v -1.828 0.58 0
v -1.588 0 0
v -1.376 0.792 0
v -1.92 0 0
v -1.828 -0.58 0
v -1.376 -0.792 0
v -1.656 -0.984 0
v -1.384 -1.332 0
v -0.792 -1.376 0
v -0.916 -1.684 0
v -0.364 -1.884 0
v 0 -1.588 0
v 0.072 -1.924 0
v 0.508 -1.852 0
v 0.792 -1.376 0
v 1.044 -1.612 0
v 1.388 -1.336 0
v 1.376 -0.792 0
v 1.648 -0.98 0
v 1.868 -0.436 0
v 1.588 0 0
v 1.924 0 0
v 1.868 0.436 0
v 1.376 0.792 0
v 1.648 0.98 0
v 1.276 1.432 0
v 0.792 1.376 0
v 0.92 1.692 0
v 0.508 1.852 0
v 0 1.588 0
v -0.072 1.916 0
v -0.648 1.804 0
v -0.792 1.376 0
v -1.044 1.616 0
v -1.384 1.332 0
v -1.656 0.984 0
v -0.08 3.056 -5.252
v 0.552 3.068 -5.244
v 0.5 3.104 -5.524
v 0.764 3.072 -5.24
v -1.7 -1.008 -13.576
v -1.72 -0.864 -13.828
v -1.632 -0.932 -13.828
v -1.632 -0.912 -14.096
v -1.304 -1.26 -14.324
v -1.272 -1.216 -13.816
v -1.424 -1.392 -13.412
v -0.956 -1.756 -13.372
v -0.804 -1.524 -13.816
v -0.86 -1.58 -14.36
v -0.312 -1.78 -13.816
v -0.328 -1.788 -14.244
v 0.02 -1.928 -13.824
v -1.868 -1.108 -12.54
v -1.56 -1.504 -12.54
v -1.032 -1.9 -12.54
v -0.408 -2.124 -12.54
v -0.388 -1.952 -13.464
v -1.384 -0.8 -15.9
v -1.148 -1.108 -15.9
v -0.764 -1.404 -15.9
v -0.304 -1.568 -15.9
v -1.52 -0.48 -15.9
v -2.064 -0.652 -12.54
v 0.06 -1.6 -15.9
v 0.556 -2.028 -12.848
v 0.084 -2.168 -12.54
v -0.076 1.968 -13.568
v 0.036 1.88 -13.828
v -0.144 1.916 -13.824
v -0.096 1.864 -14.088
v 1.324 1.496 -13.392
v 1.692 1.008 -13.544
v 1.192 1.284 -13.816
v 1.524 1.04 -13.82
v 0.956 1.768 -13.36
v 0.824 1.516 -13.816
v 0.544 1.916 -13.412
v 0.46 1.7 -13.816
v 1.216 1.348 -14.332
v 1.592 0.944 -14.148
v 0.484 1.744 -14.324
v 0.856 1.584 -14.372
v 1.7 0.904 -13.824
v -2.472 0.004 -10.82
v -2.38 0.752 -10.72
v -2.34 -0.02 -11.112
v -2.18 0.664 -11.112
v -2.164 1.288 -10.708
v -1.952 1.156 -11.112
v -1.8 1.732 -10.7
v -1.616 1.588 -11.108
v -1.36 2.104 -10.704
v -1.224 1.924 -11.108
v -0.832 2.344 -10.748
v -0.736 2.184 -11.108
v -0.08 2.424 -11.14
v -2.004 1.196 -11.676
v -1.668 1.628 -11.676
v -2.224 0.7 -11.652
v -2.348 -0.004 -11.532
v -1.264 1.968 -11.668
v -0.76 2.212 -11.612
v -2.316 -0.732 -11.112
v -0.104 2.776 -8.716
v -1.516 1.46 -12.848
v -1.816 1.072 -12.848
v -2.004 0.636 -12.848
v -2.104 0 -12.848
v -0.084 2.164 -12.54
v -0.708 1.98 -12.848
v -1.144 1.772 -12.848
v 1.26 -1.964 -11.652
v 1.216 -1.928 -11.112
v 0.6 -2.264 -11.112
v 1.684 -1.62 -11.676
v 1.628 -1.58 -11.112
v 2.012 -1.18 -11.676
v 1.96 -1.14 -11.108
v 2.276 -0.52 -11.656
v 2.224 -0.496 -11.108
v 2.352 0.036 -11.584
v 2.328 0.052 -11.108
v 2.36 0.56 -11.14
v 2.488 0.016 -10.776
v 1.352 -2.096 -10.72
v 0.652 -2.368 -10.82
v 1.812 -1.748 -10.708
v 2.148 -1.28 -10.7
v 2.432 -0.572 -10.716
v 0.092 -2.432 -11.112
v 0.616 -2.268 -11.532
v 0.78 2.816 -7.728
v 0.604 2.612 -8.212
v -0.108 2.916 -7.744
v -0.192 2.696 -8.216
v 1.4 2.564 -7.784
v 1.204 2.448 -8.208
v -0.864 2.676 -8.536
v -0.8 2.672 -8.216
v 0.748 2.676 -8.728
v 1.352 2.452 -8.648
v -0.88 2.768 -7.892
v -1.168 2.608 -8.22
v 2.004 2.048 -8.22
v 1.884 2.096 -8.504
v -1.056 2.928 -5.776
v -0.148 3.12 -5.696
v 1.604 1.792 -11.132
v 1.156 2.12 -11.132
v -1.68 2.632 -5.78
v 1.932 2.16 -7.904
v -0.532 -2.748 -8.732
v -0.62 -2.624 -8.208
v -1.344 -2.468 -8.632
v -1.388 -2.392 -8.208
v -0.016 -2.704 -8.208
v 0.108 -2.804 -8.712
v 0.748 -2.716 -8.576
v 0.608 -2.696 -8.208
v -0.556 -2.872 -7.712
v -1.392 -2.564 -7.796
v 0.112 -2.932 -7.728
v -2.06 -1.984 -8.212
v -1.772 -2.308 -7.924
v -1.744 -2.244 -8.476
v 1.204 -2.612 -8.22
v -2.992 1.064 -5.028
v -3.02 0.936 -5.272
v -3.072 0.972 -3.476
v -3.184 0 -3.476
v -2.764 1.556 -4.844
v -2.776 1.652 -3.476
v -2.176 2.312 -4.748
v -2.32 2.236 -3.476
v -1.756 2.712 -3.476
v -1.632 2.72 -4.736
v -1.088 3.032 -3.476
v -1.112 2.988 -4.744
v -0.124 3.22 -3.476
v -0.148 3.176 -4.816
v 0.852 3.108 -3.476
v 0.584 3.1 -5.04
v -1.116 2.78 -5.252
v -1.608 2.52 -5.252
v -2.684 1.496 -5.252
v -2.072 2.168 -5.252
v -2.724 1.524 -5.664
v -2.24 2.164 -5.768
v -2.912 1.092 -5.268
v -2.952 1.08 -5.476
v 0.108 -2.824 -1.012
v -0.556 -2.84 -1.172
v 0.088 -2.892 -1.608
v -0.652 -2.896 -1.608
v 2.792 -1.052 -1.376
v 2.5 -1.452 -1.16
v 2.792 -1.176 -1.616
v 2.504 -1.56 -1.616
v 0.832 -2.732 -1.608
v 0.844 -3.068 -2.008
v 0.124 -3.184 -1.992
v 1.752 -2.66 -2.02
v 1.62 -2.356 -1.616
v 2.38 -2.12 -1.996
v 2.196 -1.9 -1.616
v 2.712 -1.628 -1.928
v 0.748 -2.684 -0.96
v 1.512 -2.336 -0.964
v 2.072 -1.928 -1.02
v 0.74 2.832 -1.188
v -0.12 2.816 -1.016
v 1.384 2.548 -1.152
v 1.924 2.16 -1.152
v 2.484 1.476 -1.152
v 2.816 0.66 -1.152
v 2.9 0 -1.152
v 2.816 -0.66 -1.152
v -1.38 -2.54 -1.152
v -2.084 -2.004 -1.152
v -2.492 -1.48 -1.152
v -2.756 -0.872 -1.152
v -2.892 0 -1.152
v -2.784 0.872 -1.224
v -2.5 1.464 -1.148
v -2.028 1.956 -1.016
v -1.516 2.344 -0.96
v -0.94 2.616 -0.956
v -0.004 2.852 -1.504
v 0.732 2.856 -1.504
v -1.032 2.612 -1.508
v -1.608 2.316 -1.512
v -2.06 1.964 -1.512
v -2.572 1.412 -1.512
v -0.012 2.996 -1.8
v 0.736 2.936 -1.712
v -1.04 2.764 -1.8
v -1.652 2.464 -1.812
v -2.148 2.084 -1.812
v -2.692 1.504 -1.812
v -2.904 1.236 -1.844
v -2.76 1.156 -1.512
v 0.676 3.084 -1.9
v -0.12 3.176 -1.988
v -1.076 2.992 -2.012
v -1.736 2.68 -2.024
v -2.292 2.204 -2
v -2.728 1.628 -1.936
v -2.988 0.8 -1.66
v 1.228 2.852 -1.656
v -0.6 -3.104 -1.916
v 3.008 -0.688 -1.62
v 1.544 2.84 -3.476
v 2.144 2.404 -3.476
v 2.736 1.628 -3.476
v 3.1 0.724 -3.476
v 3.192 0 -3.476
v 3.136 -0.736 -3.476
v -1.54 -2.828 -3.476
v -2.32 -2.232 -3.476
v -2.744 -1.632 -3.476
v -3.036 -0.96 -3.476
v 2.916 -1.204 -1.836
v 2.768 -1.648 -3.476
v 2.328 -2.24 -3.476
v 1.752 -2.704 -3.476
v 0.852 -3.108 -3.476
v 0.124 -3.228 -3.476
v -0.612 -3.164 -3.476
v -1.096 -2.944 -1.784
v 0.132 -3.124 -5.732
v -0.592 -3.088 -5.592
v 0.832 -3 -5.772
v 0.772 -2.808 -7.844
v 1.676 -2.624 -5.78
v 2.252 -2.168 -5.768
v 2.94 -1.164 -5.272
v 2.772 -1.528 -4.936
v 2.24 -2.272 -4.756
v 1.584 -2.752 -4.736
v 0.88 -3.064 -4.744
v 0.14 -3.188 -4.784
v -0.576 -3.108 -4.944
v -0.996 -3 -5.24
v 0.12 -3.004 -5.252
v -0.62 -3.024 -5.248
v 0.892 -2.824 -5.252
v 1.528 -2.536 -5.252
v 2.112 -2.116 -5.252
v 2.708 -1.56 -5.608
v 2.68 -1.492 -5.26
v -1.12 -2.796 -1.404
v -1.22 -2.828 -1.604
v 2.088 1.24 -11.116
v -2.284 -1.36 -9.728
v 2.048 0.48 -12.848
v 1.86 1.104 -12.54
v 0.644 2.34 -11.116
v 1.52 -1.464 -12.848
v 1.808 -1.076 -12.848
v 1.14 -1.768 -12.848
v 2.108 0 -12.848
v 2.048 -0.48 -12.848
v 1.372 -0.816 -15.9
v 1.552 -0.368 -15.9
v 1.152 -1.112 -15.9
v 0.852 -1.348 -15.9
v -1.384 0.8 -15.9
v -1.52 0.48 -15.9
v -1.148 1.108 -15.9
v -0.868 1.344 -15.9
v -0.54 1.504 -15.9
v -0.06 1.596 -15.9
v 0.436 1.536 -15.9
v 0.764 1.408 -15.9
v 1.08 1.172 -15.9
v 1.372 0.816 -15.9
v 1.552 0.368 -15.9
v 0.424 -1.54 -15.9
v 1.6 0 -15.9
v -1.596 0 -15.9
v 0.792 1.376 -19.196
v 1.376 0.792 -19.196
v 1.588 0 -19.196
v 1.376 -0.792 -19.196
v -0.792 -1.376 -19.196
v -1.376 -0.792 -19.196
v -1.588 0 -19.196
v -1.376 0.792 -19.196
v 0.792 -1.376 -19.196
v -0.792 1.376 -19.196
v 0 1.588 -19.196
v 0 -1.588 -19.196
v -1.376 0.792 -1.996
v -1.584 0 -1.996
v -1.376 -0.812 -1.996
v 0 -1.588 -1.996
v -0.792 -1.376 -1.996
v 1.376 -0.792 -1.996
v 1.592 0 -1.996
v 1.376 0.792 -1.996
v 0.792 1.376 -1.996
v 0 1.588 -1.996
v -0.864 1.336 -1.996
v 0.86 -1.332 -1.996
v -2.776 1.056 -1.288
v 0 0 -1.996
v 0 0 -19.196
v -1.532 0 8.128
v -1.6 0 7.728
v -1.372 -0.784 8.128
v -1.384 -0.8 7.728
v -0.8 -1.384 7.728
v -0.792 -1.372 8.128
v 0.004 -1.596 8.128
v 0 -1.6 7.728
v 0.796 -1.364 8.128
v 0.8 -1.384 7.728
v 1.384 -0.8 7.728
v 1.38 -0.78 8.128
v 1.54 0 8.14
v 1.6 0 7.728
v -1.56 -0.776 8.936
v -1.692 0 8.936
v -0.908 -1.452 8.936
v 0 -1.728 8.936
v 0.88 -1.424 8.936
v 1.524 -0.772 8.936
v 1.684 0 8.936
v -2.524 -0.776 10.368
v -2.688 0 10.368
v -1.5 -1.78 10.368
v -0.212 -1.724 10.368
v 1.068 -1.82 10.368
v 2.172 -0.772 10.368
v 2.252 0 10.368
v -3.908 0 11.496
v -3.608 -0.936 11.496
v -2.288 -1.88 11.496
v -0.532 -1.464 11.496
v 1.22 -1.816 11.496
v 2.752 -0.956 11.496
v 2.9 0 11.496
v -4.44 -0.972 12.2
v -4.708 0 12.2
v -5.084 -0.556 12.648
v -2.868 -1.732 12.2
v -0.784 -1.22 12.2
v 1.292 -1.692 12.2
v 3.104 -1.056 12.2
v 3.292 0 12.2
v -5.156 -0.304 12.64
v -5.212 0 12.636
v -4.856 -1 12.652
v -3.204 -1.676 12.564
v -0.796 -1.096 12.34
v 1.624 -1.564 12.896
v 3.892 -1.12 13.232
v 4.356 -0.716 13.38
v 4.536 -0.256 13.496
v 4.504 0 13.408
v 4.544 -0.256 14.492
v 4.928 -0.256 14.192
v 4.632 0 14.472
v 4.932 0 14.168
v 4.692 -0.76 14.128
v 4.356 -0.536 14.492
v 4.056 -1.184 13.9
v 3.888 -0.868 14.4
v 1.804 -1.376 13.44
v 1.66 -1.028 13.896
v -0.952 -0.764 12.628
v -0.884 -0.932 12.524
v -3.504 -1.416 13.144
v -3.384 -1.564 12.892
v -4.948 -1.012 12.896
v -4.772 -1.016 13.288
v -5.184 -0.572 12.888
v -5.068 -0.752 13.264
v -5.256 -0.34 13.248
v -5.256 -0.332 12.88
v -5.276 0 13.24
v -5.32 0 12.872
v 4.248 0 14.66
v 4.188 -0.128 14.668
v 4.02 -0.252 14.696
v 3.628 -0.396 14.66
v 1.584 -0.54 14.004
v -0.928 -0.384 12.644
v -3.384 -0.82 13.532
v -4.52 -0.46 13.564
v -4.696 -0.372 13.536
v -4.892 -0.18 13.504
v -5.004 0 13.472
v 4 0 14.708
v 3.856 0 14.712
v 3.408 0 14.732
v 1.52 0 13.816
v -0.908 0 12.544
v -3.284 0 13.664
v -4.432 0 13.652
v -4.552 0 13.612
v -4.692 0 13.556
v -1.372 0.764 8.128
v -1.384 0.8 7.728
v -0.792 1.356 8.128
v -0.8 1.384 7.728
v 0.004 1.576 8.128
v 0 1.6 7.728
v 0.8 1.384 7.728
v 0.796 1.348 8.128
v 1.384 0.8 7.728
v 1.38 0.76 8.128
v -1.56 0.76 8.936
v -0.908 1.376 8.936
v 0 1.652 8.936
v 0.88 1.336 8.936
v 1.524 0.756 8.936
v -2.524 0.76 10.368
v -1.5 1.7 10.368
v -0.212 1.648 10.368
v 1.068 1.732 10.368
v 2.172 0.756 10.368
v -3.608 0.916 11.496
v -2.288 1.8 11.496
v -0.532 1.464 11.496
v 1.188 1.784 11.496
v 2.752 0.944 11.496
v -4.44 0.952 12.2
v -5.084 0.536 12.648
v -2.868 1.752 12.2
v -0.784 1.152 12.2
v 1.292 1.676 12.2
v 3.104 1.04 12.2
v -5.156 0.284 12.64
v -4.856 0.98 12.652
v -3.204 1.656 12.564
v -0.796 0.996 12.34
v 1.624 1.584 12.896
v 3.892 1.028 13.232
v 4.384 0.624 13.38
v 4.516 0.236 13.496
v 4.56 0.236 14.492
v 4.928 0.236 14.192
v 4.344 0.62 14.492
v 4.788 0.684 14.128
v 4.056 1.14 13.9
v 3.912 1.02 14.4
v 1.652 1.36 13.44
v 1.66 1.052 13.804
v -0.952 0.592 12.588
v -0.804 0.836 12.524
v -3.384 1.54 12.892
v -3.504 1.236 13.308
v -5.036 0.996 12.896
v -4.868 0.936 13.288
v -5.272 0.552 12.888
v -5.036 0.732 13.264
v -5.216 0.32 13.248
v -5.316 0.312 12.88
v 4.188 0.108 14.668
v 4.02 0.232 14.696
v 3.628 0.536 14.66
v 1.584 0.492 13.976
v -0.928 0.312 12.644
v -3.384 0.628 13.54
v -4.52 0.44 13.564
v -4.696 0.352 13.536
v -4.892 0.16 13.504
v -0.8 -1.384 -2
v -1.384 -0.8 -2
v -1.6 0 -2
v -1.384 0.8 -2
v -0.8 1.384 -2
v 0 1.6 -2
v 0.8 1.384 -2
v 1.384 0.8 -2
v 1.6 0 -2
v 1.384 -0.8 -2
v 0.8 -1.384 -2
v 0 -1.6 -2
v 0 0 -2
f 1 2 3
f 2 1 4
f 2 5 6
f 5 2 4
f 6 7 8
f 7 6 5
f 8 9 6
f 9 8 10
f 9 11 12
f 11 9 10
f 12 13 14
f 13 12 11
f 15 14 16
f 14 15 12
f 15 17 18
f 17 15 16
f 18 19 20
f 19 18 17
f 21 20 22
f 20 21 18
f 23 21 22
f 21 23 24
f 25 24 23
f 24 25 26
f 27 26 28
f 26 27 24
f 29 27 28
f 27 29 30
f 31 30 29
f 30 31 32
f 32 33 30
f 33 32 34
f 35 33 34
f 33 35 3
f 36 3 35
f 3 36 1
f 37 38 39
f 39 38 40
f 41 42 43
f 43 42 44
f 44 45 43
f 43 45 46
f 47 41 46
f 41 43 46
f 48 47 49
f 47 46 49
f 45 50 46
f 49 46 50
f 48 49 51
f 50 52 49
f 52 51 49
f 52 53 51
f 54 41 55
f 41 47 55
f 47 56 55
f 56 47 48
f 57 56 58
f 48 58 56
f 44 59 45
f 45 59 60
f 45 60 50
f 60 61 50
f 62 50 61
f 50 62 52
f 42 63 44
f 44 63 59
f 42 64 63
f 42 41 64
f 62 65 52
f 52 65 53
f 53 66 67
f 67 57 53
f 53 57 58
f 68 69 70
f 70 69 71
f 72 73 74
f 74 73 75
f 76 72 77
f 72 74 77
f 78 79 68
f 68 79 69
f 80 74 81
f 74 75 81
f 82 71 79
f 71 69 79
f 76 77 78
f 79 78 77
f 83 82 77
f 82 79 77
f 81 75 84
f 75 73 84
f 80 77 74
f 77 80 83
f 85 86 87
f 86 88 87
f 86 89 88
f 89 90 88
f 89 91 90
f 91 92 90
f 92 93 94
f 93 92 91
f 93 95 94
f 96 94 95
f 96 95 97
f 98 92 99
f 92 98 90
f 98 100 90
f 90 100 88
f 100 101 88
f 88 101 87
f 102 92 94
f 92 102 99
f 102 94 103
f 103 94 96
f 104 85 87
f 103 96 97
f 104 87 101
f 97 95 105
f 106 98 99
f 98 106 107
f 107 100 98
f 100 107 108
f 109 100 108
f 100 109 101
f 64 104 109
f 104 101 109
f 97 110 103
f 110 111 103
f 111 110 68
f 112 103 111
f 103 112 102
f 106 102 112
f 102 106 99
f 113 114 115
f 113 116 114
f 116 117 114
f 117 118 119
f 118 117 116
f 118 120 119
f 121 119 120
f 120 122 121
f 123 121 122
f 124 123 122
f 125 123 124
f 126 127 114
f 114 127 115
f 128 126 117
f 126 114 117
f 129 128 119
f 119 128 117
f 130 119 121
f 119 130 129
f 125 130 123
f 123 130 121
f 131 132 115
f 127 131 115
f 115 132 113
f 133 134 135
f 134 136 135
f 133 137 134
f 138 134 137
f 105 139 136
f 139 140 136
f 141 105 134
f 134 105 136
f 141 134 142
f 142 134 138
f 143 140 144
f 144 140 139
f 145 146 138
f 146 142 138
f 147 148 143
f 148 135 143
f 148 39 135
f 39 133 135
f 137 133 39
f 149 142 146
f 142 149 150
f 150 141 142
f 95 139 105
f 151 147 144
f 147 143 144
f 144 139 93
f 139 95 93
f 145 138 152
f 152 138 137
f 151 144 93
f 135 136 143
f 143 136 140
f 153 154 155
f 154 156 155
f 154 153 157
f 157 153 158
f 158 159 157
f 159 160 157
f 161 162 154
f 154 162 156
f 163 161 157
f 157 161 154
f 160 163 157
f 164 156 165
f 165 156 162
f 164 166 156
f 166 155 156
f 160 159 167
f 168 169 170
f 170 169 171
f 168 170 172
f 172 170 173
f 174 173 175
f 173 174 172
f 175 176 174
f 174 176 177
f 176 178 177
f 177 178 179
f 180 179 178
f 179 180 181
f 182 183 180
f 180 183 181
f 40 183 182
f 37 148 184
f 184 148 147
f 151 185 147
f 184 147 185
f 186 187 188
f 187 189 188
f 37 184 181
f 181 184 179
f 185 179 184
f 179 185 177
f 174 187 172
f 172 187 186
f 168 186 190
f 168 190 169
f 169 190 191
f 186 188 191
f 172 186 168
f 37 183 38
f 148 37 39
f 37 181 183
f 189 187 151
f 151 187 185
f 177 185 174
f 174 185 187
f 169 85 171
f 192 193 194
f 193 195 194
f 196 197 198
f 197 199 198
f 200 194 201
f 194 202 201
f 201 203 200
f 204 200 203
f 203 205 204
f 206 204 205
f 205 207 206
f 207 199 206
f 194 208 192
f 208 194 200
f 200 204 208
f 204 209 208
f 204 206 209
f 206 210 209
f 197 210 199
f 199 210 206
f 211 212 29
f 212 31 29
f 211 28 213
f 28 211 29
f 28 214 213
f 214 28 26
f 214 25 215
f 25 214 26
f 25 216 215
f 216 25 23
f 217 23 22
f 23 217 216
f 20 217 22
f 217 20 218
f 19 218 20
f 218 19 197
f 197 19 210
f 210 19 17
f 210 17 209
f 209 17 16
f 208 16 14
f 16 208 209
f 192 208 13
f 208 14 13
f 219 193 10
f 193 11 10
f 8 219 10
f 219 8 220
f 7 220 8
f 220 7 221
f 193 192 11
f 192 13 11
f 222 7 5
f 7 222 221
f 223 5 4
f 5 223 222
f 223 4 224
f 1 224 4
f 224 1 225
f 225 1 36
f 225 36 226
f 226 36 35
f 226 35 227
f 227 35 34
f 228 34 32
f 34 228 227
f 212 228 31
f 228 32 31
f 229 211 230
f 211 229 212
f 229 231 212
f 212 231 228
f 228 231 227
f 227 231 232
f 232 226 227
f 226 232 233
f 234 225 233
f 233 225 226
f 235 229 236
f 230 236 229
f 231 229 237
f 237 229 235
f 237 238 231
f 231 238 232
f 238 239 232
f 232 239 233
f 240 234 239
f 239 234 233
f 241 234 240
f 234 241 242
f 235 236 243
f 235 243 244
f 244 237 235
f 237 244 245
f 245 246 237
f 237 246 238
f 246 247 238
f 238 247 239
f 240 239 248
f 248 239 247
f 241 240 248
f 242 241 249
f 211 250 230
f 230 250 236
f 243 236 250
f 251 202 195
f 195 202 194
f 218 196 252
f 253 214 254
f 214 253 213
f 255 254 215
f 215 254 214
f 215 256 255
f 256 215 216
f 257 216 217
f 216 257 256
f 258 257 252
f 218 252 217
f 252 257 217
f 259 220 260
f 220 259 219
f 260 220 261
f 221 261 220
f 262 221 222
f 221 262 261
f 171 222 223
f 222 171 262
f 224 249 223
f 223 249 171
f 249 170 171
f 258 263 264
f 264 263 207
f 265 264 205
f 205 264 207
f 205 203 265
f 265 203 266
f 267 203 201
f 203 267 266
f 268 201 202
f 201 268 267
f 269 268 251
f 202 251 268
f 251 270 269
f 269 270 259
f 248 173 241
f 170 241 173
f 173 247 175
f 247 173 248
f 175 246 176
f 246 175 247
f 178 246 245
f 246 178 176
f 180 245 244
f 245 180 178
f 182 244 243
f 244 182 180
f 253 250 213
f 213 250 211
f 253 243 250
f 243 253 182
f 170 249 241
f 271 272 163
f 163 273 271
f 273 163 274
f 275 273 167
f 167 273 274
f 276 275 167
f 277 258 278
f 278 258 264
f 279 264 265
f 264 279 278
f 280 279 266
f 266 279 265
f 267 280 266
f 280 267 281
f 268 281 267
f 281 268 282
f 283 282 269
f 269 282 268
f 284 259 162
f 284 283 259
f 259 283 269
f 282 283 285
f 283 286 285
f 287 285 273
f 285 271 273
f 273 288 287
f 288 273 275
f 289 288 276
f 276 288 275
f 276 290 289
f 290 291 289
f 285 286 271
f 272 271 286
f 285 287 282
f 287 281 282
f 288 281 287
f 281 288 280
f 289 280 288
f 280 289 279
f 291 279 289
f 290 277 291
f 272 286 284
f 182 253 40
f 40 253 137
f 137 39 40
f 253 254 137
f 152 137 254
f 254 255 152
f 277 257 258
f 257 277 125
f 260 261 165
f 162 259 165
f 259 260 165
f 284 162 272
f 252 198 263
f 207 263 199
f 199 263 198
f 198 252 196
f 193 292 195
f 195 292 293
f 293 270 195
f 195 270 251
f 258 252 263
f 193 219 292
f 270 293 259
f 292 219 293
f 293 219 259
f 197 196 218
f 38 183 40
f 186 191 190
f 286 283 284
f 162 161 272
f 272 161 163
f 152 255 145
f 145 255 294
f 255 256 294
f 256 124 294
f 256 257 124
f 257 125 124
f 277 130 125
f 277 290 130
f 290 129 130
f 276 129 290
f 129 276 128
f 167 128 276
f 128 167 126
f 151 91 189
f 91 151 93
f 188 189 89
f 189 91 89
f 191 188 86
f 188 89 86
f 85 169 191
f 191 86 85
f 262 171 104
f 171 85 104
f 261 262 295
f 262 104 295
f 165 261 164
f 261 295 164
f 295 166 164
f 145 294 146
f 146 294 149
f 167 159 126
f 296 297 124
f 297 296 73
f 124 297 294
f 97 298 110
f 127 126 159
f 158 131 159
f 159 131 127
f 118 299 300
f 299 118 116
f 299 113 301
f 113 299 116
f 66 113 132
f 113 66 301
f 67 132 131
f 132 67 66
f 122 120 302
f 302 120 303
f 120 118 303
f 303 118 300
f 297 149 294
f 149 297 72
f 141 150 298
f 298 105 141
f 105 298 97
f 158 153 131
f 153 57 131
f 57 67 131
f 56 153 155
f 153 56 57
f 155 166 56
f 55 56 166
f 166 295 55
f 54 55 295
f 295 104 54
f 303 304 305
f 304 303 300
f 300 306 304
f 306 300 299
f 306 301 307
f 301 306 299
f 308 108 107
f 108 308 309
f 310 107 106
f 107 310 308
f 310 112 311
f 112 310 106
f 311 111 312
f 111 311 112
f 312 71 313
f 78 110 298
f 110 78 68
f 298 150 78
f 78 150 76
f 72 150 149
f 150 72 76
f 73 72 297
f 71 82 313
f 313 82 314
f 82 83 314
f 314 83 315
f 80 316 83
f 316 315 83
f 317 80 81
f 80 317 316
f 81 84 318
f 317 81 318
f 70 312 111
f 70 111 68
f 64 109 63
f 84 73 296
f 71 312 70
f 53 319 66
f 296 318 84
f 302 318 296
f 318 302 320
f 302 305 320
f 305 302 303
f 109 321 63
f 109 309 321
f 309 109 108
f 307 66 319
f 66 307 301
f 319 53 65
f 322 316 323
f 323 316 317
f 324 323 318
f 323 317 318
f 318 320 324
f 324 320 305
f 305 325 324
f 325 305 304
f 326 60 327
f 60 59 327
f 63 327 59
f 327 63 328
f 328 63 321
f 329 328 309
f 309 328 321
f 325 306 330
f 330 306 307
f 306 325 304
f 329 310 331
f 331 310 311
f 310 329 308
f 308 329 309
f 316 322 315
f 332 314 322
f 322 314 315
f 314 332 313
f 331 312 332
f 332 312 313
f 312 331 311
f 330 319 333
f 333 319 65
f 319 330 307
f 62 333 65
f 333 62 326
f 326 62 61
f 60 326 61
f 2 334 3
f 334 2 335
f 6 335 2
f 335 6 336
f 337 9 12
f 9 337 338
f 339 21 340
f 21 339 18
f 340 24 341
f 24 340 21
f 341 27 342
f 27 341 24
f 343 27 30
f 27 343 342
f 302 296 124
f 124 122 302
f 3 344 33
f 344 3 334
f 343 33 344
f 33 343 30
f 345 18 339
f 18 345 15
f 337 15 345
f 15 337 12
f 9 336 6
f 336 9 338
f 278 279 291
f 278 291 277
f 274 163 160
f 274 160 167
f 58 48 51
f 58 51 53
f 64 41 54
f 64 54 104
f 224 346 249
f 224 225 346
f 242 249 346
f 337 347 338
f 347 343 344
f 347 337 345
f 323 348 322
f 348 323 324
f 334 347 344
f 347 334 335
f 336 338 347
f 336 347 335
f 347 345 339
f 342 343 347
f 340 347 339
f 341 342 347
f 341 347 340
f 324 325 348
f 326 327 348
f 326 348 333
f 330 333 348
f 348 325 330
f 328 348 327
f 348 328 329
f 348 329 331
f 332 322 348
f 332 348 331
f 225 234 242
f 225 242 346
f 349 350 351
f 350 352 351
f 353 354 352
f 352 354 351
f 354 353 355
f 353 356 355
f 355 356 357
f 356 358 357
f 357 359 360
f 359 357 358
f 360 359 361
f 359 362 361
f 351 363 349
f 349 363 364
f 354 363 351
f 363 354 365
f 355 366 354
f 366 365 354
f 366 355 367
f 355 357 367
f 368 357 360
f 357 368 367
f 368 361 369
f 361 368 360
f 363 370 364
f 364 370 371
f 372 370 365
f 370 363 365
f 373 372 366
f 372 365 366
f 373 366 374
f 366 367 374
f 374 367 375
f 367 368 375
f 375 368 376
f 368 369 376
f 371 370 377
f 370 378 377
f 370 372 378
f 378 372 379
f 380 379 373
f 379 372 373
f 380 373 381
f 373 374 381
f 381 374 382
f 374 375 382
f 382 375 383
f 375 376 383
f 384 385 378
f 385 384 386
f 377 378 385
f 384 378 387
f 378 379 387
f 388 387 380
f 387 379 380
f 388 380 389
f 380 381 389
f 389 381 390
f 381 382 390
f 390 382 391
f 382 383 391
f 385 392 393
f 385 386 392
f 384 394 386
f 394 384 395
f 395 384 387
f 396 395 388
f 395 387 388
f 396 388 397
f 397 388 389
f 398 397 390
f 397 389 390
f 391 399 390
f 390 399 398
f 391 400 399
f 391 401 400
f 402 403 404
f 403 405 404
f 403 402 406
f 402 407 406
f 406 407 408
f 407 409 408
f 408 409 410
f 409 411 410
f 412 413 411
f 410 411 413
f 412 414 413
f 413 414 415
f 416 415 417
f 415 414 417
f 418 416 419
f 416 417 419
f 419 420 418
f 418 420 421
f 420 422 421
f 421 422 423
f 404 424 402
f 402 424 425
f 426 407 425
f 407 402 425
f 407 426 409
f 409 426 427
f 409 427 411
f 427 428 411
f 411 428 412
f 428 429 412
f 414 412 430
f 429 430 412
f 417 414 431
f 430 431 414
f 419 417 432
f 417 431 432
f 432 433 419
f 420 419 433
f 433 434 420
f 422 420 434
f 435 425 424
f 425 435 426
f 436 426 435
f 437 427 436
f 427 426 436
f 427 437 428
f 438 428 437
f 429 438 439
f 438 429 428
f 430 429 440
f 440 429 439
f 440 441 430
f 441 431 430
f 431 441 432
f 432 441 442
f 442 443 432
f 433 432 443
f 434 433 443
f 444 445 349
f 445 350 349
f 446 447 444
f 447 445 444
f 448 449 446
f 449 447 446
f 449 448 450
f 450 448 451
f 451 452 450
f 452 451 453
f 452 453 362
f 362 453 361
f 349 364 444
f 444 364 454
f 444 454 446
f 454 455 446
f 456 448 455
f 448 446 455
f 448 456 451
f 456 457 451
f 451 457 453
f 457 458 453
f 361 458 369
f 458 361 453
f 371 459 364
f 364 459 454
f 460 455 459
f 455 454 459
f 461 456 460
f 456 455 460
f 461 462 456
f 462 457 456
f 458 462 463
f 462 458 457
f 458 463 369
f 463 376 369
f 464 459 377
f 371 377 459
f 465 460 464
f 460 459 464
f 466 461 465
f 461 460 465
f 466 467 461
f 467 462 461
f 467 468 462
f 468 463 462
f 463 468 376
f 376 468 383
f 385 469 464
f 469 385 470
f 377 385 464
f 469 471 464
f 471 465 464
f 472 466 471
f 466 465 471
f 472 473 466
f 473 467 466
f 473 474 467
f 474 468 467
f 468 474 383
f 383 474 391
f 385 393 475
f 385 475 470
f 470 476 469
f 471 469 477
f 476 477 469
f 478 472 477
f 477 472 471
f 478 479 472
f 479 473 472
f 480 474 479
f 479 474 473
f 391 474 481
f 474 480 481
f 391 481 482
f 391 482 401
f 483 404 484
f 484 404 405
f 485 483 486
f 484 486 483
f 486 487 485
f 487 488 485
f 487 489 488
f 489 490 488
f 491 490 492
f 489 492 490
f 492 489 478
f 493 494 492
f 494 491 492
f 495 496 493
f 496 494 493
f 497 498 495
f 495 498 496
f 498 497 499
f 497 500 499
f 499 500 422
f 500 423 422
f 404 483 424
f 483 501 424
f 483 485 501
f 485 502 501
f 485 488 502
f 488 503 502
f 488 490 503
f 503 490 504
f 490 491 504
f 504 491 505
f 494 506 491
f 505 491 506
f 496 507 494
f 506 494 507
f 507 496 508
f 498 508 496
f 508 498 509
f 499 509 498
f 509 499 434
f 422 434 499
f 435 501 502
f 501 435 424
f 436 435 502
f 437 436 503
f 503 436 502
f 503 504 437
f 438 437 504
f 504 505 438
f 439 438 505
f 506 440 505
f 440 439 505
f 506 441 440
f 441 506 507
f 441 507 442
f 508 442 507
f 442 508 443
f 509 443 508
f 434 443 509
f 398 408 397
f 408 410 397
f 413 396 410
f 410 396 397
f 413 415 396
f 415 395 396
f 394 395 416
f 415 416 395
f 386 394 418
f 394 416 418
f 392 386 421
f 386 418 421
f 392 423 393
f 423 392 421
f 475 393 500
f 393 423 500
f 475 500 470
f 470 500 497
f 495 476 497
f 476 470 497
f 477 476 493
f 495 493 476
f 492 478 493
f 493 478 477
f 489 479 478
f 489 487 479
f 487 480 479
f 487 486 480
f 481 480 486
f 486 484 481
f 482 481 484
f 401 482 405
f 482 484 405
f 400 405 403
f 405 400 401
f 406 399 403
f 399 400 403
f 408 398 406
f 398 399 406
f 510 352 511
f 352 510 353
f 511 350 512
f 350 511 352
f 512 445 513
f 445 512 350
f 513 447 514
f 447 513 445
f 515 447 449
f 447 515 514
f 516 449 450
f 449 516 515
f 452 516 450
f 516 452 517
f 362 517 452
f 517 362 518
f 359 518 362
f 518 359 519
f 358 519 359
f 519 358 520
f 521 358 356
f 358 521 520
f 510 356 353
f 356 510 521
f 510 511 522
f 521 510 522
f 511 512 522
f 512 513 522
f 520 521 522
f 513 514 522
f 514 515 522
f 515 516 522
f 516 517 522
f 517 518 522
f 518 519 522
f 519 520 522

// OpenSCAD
use <../lib.scad>
use <33172.scad>
use <33183.scad>
function ldraw_lib__33172c02() = [
// 0 Minifig Food Carrot with Bright_Green Leaves (Complete)
// 0 Name: 33172c02.dat
// 0 Author: Steffen [Steffen]
// 0 !LDRAW_ORG Shortcut UPDATE 2012-01
// 0 !LICENSE Licensed under CC BY 2.0 and CC BY 4.0 : see CAreadme.txt
// 
// 0 BFC CERTIFY CCW
  [0,"BFC","CERTIFY"],
  [0,"BFC","CCW"],
// 
// 0 !CATEGORY Minifig Accessory
// 
// 0 !CMDLINE -c25
// 
// 0 !HISTORY 2012-03-30 [PTadmin] Official Update 2012-01
// 
// 
// 1 16 0 0 0 1 0 0 0 1 0 0 0 1 33172.dat
  [1,16,0,0,0,1,0,0,0,1,0,0,0,1, ldraw_lib__33172()],
// 1 10 0 5 0 1 0 0 0 1 0 0 0 1 33183.dat
  [1,10,0,5,0,1,0,0,0,1,0,0,0,1, ldraw_lib__33183()],
// 
];
module ldraw_lib__33172c02(step=0, col=false, unit=2/5, alt=false, line=0.2, solid=!$preview)
    makepoly(ldraw_lib__33172c02(), step=step, col=col, unit=unit, alt=alt, line=line, solid=solid);
ldraw_lib__33172c02(line=0.2);
